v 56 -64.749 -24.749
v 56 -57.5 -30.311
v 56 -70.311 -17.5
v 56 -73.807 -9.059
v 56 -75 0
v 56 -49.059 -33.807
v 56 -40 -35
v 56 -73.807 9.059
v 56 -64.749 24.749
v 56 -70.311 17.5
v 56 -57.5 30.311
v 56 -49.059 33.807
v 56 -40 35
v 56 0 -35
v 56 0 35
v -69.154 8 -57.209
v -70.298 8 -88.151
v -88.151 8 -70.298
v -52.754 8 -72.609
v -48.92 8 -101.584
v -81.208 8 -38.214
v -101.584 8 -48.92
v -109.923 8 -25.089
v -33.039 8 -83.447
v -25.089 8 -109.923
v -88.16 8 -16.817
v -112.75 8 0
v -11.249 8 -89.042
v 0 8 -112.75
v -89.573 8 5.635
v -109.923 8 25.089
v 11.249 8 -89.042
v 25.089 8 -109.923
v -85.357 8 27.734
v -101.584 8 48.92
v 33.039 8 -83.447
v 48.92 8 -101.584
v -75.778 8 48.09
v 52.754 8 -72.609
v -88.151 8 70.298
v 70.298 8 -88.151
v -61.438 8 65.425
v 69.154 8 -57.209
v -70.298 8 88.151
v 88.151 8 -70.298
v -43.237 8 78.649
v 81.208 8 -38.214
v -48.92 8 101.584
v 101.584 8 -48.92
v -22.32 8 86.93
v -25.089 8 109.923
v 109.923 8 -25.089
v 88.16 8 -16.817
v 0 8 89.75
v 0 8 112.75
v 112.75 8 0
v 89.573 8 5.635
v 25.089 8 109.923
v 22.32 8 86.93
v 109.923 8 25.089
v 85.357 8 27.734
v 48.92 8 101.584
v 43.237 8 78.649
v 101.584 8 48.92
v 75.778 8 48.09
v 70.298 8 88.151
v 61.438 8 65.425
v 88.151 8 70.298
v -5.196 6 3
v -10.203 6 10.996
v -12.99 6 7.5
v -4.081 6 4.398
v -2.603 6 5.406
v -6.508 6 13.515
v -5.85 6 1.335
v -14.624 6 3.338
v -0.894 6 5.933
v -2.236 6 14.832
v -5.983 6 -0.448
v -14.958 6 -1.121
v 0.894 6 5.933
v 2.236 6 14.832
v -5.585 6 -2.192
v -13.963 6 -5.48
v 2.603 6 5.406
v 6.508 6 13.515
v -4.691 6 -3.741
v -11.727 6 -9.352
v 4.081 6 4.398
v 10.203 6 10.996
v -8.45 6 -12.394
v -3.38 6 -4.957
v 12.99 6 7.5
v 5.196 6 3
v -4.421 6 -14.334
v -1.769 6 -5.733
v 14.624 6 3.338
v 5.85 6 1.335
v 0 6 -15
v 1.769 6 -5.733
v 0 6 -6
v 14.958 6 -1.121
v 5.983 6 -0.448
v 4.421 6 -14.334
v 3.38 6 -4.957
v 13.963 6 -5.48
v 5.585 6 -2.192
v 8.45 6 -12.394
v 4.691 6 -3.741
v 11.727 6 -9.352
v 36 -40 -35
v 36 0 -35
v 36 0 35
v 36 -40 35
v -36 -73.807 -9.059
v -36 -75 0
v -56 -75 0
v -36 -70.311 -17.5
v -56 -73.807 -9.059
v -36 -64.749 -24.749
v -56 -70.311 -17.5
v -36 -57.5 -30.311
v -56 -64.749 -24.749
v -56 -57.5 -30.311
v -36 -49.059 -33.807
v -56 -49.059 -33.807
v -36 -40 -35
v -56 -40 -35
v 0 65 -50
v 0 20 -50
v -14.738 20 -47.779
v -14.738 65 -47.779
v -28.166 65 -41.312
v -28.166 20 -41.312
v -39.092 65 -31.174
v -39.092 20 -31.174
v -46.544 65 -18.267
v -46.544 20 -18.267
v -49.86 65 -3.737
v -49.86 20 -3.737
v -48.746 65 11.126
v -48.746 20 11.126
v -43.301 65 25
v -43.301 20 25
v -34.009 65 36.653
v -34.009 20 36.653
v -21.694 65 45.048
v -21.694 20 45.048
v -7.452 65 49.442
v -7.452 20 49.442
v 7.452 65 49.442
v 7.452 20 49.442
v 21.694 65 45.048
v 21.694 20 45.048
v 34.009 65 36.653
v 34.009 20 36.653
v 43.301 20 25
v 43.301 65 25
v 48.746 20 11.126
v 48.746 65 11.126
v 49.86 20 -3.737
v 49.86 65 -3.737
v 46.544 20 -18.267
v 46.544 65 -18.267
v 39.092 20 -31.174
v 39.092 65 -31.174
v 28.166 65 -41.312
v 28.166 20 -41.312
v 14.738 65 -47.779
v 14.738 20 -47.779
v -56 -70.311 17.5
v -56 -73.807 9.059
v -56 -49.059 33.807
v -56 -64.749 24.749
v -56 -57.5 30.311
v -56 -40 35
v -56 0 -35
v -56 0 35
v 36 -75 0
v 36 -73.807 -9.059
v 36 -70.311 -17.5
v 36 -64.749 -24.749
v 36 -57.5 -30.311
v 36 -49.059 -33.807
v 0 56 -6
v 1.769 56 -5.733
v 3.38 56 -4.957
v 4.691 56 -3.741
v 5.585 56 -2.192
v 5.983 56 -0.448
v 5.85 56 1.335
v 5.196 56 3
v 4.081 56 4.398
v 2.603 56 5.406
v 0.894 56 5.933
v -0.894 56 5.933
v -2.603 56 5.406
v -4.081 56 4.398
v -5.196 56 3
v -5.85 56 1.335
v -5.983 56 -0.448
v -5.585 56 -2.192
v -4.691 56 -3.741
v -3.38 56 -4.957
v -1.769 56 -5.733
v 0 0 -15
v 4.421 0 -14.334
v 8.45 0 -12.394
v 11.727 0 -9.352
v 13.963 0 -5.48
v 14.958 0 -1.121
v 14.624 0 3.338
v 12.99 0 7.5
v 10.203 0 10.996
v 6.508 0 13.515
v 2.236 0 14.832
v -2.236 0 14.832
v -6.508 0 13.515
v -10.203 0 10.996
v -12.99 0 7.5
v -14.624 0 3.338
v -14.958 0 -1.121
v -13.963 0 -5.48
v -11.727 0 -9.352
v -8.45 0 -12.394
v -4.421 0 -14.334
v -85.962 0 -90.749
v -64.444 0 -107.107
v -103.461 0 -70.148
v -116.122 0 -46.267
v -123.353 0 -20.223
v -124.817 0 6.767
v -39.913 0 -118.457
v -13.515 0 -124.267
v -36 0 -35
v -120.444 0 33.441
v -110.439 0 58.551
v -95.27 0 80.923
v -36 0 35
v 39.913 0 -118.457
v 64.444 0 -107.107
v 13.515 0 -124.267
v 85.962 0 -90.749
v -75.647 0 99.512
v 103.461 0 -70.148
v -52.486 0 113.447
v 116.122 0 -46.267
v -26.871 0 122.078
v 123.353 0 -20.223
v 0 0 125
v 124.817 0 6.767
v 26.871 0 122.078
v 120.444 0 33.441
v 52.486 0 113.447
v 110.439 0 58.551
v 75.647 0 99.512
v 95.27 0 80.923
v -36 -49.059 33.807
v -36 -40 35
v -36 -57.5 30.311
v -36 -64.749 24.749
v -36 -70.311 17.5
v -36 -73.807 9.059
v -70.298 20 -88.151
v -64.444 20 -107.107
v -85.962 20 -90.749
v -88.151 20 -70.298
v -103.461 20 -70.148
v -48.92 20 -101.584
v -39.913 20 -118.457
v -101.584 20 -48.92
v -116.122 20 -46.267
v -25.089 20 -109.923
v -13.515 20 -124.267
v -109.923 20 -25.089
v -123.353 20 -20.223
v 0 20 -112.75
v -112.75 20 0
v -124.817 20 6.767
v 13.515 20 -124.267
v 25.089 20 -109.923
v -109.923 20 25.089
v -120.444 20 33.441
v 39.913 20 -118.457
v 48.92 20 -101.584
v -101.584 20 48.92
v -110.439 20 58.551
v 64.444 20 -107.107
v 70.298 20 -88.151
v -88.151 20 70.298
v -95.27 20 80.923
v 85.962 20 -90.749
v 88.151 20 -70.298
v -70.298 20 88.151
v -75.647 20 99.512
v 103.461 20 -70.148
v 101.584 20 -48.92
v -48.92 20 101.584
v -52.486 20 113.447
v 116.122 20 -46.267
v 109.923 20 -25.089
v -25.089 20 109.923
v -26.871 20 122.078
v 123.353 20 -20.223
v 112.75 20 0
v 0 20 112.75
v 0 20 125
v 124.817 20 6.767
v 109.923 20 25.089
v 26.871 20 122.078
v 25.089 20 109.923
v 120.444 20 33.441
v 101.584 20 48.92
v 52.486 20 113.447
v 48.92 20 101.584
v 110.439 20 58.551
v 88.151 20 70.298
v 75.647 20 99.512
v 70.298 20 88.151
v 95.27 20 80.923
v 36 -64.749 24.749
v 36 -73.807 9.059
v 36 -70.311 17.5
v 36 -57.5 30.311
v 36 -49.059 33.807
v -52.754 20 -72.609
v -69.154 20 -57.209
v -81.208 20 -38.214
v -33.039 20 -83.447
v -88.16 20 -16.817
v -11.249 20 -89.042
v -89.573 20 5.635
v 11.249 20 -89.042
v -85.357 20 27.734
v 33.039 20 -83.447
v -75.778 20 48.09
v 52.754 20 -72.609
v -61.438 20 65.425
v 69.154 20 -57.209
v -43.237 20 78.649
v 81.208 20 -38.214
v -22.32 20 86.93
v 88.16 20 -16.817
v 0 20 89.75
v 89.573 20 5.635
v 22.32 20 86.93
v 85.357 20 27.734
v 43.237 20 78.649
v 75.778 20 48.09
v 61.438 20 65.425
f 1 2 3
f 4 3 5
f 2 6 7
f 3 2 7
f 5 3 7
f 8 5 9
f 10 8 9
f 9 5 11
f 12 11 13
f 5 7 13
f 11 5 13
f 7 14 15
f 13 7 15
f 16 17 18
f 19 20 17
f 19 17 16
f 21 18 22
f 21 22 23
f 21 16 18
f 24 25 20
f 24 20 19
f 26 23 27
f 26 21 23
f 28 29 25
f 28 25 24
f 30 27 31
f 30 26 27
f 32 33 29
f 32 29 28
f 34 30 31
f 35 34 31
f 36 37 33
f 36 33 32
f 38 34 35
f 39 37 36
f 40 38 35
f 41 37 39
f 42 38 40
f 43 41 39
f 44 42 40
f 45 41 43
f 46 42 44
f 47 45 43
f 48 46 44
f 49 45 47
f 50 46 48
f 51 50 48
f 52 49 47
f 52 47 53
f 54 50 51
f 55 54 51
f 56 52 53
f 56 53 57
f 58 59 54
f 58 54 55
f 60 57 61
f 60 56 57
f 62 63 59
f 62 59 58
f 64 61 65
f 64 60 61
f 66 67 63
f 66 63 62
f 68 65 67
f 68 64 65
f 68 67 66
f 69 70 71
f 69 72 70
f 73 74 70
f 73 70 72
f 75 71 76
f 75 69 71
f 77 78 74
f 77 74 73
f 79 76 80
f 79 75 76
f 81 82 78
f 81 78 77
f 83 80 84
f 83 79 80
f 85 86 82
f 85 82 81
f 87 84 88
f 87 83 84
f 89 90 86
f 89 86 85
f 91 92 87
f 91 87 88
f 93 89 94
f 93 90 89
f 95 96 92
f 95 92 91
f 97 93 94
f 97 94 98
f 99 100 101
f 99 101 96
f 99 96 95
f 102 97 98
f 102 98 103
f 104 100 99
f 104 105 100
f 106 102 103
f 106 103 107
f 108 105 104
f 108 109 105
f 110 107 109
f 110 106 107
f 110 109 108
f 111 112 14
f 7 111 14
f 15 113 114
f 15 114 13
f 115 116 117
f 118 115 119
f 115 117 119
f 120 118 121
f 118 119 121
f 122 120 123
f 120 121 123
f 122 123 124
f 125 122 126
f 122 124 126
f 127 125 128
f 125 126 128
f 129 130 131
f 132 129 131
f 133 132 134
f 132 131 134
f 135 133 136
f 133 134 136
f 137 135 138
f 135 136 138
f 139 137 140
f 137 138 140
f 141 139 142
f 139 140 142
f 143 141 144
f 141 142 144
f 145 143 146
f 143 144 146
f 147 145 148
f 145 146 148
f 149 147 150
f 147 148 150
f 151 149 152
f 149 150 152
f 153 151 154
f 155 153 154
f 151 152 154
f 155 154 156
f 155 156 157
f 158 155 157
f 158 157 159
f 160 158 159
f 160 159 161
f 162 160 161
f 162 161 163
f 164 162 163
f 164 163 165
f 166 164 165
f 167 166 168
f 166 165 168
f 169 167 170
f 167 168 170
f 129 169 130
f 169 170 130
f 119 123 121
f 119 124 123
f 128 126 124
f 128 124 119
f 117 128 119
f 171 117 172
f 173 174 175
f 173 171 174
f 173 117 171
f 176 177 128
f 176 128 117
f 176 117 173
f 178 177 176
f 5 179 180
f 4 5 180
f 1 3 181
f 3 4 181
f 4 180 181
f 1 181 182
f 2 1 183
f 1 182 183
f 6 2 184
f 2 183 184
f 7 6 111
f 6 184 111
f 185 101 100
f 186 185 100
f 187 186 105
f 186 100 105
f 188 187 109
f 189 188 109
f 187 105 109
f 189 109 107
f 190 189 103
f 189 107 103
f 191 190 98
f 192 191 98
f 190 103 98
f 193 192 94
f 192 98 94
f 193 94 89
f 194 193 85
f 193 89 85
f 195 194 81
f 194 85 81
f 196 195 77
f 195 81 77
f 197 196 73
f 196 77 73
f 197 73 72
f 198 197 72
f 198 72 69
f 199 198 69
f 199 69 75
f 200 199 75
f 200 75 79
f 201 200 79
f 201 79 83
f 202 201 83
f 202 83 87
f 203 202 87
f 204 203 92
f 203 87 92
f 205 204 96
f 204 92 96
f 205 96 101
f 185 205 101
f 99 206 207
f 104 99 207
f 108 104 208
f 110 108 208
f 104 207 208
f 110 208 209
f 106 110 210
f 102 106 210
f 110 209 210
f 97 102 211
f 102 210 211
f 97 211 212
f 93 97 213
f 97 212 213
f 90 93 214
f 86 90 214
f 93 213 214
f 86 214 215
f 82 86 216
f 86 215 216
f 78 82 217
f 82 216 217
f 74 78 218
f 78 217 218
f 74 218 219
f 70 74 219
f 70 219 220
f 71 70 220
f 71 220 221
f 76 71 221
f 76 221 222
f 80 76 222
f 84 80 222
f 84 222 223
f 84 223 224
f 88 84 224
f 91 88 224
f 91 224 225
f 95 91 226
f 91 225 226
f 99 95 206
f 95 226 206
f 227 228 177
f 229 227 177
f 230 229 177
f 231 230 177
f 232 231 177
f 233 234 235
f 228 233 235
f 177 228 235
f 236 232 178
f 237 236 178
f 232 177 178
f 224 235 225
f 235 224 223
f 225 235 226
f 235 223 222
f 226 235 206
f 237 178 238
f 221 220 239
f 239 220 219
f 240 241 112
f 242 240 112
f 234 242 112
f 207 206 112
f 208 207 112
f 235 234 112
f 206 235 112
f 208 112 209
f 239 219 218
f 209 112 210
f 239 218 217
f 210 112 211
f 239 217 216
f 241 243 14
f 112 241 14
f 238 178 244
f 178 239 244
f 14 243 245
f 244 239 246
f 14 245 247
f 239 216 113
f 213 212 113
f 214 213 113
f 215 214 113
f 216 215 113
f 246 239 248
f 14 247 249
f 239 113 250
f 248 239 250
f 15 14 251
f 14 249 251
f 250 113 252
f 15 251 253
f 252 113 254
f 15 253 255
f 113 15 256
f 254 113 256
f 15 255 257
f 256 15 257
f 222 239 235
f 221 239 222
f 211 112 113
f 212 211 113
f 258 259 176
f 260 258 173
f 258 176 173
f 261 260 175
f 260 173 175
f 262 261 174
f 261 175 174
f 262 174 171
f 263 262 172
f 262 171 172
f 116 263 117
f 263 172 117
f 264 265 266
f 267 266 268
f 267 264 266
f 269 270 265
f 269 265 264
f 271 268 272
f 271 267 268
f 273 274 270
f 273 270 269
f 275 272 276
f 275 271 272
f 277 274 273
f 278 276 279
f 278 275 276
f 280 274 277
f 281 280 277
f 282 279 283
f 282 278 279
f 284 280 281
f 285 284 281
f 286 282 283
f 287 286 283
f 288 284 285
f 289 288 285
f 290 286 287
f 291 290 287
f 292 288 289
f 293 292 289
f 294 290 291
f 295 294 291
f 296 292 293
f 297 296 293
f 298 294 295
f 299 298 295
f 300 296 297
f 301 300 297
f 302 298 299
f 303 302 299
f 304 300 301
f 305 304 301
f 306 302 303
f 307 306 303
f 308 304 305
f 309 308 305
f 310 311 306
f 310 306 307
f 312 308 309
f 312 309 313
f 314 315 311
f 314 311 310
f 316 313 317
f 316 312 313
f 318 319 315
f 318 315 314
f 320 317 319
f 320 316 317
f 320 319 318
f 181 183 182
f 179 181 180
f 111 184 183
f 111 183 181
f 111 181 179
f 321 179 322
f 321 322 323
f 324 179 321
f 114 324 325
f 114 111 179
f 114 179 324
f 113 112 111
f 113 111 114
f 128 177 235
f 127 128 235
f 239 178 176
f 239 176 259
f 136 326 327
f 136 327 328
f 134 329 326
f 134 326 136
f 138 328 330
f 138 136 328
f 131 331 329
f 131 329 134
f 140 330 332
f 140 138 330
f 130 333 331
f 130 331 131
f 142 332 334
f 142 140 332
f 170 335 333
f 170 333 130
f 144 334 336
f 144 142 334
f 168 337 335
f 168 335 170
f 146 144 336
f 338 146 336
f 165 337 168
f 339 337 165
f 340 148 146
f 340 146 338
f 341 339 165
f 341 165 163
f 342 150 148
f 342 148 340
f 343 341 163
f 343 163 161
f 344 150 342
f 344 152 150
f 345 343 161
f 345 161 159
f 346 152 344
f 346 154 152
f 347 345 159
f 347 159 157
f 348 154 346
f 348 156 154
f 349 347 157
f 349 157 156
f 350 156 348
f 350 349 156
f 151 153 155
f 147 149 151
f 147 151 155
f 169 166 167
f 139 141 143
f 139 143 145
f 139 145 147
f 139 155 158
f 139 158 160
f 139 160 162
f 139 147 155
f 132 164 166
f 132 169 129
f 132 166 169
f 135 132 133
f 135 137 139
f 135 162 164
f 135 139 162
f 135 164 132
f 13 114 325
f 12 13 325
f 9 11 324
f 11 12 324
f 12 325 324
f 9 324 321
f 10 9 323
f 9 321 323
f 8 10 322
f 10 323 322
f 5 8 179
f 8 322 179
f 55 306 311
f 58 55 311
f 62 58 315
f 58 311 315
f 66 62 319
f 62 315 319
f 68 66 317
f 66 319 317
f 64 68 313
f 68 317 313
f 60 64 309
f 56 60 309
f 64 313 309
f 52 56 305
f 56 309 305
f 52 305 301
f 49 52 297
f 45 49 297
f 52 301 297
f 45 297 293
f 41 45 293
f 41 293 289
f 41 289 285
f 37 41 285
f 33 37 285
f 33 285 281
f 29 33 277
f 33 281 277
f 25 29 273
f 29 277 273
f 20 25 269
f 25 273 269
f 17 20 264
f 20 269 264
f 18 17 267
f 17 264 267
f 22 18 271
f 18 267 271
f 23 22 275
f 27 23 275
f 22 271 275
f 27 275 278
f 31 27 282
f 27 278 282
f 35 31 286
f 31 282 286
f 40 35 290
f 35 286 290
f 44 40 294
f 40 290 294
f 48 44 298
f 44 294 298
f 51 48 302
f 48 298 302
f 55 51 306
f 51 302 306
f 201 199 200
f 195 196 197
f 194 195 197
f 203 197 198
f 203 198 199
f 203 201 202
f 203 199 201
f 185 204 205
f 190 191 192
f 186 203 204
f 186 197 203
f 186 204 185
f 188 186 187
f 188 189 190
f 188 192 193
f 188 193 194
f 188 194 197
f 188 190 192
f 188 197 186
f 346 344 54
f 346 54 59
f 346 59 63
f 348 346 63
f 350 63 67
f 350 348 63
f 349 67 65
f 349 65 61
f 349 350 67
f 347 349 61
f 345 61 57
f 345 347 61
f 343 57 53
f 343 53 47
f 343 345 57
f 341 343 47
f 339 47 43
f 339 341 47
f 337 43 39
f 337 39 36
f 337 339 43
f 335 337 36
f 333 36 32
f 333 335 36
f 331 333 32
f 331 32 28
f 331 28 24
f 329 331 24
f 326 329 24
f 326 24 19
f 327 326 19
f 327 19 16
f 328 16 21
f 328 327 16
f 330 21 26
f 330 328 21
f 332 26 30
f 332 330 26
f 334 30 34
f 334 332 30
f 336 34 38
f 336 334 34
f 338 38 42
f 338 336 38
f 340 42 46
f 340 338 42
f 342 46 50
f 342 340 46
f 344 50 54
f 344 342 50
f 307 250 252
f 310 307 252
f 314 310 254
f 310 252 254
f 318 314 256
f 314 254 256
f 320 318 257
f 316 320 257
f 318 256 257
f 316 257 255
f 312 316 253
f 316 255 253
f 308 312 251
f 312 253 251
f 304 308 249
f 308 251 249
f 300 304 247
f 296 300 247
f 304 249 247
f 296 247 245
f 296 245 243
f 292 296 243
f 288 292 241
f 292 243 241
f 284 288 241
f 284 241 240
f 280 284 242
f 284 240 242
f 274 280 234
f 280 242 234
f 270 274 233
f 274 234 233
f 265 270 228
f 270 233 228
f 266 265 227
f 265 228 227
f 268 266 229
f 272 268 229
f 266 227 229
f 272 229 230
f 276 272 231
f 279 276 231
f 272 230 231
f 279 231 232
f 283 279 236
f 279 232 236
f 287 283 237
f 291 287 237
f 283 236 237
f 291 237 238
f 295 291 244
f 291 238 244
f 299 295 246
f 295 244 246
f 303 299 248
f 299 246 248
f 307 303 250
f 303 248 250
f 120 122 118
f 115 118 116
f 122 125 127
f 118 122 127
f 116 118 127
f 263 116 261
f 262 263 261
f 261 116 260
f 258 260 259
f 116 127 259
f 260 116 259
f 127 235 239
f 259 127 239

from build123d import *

# Parameters (mm, degrees)
SKIZZE1_R                       = 125
AUFSATZ_LINEAR_AUSTRAGEN1_DEPTH = 20
SKIZZE2_R                       = 50
AUFSATZ_LINEAR_AUSTRAGEN2_DEPTH = 45
SKIZZE3_W                       = 20
SKIZZE3_H                       = 70
AUFSATZ_LINEAR_AUSTRAGEN3_DEPTH = 75
SCHNITT_LINEAR_AUSTRAGEN1_REACH = 234.403
SKIZZE5_R                       = 112.75
SKIZZE5_R_2                     = 89.75
SCHNITT_LINEAR_AUSTRAGEN2_DEPTH = 12
SKIZZE6_R                       = 15
SCHNITT_LINEAR_AUSTRAGEN3_DEPTH = 6
SKIZZE7_R                       = 6
SCHNITT_LINEAR_AUSTRAGEN4_DEPTH = 50


with BuildPart() as part:
    # Skizze1 → Aufsatz-Linear austragen1 (new body)
    with BuildSketch(Plane(origin=(0, 0, 0), x_dir=(1, 0, 0), z_dir=(0, 1, 0))):
        with Locations(Location((0, 0, 0), (0, 0, 270))):
            Circle(SKIZZE1_R)
    extrude(amount=AUFSATZ_LINEAR_AUSTRAGEN1_DEPTH)

    # Skizze2 → Aufsatz-Linear austragen2 (add)
    with BuildSketch(Plane(origin=(0, 20, 0), x_dir=(1, 0, 0), z_dir=(0, 1, 0))):
        with Locations(Location((0, 0, 0), (0, 0, 90))):
            Circle(SKIZZE2_R)
    extrude(amount=AUFSATZ_LINEAR_AUSTRAGEN2_DEPTH)

    # Skizze3 → Aufsatz-Linear austragen3 (add)
    with BuildSketch(Plane.XZ):
        with Locations((-46, 0)):
            Rectangle(SKIZZE3_W, SKIZZE3_H)
        with Locations((46, 0)):
            Rectangle(SKIZZE3_W, SKIZZE3_H)
    extrude(amount=AUFSATZ_LINEAR_AUSTRAGEN3_DEPTH)

    # Schnitt-Linear austragen1: up to this face of the body (flat: up to its plane)
    schnitt_linear_austragen1_end = Plane(part.part.faces().sort_by_distance((56, -37.5, 0))[0])
    # Skizze4 → Schnitt-Linear austragen1 (cut, up to the picked face)
    with BuildSketch(Plane.ZY.offset(56), mode=Mode.PRIVATE) as schnitt_linear_austragen1_sk1:
        with BuildLine():
            ThreePointArc((0, -75), (-24.748737342, -64.748737342), (-35, -40))
            Line((-35, -40), (-35, -75))
            Line((-35, -75), (0, -75))
        make_face()
    schnitt_linear_austragen1_tool1 = split(extrude(schnitt_linear_austragen1_sk1.sketch, amount=-SCHNITT_LINEAR_AUSTRAGEN1_REACH, mode=Mode.PRIVATE), bisect_by=schnitt_linear_austragen1_end, keep=Keep.BOTH, mode=Mode.PRIVATE)
    # Skizze4 → Schnitt-Linear austragen1 (cut, up to the picked face)
    with BuildSketch(Plane.ZY.offset(56), mode=Mode.PRIVATE) as schnitt_linear_austragen1_sk2:
        with BuildLine():
            Line((35, -75), (35, -40))
            ThreePointArc((35, -40), (24.748737342, -64.748737342), (0, -75))
            Line((0, -75), (35, -75))
        make_face()
    schnitt_linear_austragen1_tool2 = split(extrude(schnitt_linear_austragen1_sk2.sketch, amount=-SCHNITT_LINEAR_AUSTRAGEN1_REACH, mode=Mode.PRIVATE), bisect_by=schnitt_linear_austragen1_end, keep=Keep.BOTH, mode=Mode.PRIVATE)
    add(schnitt_linear_austragen1_tool1.solids().sort_by(Axis((-56, -67.182122, -27.182122), (1, 0, 0)))[0], mode=Mode.SUBTRACT)
    add(schnitt_linear_austragen1_tool2.solids().sort_by(Axis((-56, -67.182122, 27.182122), (1, 0, 0)))[0], mode=Mode.SUBTRACT)

    # Skizze5 → Schnitt-Linear austragen2 (cut)
    with BuildSketch(Plane(origin=(0, 20, 0), x_dir=(1, 0, 0), z_dir=(0, 1, 0))):
        with Locations(Location((0, 0, 0), (0, 0, 270))):
            Circle(SKIZZE5_R)
        with Locations(Location((0, 0, 0), (0, 0, 270))):
            Circle(SKIZZE5_R_2, mode=Mode.SUBTRACT)
    extrude(amount=-SCHNITT_LINEAR_AUSTRAGEN2_DEPTH, mode=Mode.SUBTRACT)

    # Skizze6 → Schnitt-Linear austragen3 (cut)
    with BuildSketch(Plane.XZ):
        with Locations(Location((0, 0, 0), (0, 0, 270))):
            Circle(SKIZZE6_R)
    extrude(amount=-SCHNITT_LINEAR_AUSTRAGEN3_DEPTH, mode=Mode.SUBTRACT)

    # Skizze7 → Schnitt-Linear austragen4 (cut)
    with BuildSketch(Plane(origin=(0, 6, 0), x_dir=(-1, 0, 0), z_dir=(0, -1, 0))):
        with Locations(Location((0, 0, 0), (0, 0, 90))):
            Circle(SKIZZE7_R)
    extrude(amount=-SCHNITT_LINEAR_AUSTRAGEN4_DEPTH, mode=Mode.SUBTRACT)


solid = part.part
